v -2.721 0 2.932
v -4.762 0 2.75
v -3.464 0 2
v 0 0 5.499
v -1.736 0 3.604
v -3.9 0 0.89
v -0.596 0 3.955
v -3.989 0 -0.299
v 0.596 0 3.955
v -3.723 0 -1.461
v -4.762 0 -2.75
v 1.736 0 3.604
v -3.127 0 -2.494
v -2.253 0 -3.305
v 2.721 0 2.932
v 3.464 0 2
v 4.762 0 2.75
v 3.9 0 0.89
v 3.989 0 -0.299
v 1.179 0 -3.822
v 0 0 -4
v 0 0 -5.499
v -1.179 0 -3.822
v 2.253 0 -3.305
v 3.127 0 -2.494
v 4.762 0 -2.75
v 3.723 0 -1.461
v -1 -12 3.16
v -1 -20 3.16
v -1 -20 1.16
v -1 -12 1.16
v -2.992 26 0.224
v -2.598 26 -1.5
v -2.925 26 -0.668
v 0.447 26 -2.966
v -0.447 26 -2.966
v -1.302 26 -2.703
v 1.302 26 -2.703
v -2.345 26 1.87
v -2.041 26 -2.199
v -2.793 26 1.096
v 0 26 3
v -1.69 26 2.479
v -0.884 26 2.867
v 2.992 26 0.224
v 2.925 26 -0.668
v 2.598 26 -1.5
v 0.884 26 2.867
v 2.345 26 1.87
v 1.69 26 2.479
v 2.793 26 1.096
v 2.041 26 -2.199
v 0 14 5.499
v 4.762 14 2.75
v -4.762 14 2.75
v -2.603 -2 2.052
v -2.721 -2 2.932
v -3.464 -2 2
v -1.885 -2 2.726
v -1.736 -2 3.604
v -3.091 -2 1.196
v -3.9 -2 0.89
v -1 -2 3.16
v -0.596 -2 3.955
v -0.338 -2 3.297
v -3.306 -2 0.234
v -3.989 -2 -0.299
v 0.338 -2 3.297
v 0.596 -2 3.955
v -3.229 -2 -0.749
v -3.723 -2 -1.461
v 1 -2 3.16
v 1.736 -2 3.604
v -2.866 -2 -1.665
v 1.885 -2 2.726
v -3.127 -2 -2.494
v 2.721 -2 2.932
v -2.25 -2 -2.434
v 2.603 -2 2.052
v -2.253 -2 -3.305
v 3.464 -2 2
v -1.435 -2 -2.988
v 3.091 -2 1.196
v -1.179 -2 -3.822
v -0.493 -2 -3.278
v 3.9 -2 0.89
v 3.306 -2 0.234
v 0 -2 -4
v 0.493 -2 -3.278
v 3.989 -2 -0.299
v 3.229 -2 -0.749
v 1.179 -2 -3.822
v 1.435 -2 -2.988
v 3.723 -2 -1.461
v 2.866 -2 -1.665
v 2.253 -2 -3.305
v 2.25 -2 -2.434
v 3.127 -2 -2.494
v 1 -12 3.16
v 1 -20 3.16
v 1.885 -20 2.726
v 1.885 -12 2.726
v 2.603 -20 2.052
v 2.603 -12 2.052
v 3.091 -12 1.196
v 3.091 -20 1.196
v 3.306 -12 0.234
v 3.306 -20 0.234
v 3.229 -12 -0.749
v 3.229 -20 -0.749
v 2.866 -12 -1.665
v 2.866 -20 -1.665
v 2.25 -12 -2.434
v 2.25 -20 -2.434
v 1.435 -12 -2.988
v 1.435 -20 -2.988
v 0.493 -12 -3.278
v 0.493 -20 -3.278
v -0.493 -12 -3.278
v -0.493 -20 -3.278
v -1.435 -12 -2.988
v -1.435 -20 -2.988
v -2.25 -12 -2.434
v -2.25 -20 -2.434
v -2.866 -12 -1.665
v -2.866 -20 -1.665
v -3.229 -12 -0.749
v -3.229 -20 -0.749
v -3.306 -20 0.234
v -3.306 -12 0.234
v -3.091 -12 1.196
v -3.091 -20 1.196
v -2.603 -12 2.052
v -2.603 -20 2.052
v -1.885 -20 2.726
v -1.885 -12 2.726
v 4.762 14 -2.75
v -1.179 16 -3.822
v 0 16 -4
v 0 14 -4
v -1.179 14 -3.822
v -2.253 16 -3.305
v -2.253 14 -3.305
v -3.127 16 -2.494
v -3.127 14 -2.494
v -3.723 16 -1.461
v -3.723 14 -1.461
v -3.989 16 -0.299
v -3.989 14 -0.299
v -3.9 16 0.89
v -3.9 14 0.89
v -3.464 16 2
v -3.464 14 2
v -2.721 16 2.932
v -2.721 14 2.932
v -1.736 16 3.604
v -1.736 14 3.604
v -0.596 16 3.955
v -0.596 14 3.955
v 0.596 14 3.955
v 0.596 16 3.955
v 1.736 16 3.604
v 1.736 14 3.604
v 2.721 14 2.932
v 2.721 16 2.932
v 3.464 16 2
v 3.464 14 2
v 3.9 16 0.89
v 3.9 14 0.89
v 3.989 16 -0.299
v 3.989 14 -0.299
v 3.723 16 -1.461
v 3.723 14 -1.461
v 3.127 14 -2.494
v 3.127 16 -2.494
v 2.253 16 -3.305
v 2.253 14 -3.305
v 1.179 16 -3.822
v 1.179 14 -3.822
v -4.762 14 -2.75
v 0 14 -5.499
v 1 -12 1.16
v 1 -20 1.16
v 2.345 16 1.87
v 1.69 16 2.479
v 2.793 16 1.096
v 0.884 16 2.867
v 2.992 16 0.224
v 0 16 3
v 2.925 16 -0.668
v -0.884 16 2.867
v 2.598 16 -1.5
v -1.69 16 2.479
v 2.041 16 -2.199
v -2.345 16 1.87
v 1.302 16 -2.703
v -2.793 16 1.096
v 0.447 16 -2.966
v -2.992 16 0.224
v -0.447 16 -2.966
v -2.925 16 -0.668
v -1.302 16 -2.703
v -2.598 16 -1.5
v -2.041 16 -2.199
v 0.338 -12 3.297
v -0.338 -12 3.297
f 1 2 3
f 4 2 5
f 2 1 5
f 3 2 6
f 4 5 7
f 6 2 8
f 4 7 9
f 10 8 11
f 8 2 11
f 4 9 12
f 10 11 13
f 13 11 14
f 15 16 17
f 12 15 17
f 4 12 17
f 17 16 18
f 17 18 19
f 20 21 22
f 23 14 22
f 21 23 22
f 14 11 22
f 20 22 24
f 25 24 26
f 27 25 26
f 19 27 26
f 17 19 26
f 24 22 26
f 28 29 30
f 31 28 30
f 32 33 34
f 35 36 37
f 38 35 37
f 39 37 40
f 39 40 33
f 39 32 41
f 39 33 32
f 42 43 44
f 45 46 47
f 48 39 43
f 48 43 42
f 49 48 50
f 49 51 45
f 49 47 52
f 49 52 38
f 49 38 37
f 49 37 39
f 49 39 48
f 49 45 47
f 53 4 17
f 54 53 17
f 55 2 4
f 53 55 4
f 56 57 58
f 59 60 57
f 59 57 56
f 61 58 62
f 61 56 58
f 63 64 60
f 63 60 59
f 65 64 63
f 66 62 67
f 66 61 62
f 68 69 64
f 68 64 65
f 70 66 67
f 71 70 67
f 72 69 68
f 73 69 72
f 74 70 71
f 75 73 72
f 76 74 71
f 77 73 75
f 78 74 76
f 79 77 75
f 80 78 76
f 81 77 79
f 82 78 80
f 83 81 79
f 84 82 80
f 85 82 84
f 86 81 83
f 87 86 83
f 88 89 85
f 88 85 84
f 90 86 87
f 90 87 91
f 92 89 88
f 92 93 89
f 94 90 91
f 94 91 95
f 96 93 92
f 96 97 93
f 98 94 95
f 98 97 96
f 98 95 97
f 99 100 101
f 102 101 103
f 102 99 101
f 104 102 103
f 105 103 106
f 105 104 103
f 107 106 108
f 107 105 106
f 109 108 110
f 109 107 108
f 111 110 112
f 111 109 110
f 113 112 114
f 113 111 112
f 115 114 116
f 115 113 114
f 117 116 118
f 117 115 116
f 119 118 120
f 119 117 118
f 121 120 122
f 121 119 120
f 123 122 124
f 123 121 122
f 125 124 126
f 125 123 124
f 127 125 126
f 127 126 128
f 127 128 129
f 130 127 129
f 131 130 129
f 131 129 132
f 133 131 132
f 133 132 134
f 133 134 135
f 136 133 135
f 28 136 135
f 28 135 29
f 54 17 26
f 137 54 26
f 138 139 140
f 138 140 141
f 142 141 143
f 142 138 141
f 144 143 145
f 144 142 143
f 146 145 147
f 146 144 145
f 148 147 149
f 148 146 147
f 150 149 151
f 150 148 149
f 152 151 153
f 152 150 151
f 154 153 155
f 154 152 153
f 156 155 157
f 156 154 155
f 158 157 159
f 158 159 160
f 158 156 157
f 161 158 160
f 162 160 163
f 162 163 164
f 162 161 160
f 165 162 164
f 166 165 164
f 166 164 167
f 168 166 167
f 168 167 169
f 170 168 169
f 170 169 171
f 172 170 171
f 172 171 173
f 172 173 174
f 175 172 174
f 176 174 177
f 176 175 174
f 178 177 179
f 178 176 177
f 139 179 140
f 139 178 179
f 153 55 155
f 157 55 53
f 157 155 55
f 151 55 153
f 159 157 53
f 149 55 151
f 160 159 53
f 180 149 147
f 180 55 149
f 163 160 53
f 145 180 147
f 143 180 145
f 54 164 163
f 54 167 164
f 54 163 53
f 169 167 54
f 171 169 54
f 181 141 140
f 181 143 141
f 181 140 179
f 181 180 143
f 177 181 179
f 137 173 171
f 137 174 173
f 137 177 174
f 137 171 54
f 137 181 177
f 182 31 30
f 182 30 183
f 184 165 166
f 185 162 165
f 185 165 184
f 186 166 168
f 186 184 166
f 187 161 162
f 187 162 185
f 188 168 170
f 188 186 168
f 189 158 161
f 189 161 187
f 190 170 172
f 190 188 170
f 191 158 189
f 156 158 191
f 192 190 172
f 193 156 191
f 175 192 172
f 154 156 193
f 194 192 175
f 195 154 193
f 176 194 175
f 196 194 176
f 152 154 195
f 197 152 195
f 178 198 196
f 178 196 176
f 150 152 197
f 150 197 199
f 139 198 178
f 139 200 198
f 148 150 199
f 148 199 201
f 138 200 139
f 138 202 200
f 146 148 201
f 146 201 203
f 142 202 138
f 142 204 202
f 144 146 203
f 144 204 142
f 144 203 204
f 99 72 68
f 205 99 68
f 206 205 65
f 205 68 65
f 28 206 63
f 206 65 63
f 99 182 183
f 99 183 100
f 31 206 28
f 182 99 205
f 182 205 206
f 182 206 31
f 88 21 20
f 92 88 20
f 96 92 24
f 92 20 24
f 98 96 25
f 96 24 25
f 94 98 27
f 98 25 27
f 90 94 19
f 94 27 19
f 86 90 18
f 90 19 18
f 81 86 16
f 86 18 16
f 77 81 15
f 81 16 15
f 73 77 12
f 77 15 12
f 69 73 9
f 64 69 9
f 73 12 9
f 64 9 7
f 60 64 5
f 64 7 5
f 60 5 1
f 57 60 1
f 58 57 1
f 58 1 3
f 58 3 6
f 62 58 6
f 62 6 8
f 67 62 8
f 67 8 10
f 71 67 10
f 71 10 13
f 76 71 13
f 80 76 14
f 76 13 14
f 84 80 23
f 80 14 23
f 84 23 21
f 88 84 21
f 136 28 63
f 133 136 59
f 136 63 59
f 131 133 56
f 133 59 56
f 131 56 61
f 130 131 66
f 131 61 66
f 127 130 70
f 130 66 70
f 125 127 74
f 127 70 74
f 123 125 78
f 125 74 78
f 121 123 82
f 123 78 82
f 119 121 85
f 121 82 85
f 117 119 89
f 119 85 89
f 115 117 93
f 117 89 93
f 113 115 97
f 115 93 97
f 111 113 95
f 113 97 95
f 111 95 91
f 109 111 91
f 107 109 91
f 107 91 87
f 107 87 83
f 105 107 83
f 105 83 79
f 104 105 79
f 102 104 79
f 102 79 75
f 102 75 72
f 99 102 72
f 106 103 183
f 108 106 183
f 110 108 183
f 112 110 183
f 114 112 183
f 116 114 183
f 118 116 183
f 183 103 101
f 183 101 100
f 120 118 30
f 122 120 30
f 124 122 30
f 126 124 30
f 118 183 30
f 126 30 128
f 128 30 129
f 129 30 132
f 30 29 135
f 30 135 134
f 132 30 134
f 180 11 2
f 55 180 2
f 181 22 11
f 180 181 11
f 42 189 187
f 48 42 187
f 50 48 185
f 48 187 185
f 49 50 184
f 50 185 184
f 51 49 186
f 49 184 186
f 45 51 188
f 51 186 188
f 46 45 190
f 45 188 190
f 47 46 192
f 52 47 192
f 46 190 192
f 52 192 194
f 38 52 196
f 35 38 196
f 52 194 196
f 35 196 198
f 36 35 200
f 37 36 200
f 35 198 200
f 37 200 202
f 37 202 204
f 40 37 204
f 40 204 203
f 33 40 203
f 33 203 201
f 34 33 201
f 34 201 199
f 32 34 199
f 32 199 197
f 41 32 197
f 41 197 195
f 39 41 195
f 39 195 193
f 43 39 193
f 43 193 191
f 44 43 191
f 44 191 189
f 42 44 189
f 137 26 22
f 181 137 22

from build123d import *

# Parameters (mm, degrees)
BOSS_EXTRUDE1_DEPTH = 14
SKETCH4_R           = 4
BOSS_EXTRUDE2_DEPTH = 2
SKETCH4_7_R         = 3.314528
BOSS_EXTRUDE3_DEPTH = 12
BOSS_EXTRUDE5_START = 2
SKETCH5_R           = 4
SKETCH5_R_2         = 3
BOSS_EXTRUDE5_DEPTH = 2
SKETCH5_4_R         = 3
BOSS_EXTRUDE6_DEPTH = 12
BOSS_EXTRUDE7_DEPTH = 20


with BuildPart() as part:
    # Sketch1 → Boss-Extrude1 (new body)
    with BuildSketch(Plane(origin=(0, 0, 0), x_dir=(1, 0, 0), z_dir=(0, 1, 0))):
        Polygon((4.7625, -2.749631), (4.7625, 2.749631), (0, 5.499261), (-4.7625, 2.749631), (-4.7625, -2.749631), (0, -5.499261), align=None)
    extrude(amount=BOSS_EXTRUDE1_DEPTH)

    # Sketch4 → Boss-Extrude2 (add)
    with BuildSketch(Plane.XZ):
        with Locations(Location((0, 0, 0), (0, 0, 270))):
            Circle(SKETCH4_R)
    extrude(amount=BOSS_EXTRUDE2_DEPTH)

    # Sketch4<7> → Boss-Extrude3 (add)
    with BuildSketch(Plane.XZ):
        with Locations(Location((0, 0, 0), (0, 0, 270))):
            Circle(SKETCH4_7_R)
        with BuildLine():
            Line((-1, 3.160079), (-1, 1.160079))
            Line((-1, 1.160079), (1, 1.160079))
            Line((1, 1.160079), (1, 3.160079))
            ThreePointArc((1, 3.160079), (0, -3.314528), (-1, 3.160079))
        make_face()
    extrude(amount=BOSS_EXTRUDE3_DEPTH)

    # Sketch5 → Boss-Extrude5 (add)
    # profile 1 of 2: a face of its own
    with BuildSketch(Plane(origin=(0, 14, 0), x_dir=(1, 0, 0), z_dir=(0, 1, 0)).offset(BOSS_EXTRUDE5_START)):
        with Locations(Location((0, 0, 0), (0, 0, 90))):
            Circle(SKETCH5_R)
        Circle(SKETCH5_R_2, mode=Mode.SUBTRACT)
    # profile 2 of 2: a face of its own
    with BuildSketch(Plane(origin=(0, 14, 0), x_dir=(1, 0, 0), z_dir=(0, 1, 0)).offset(BOSS_EXTRUDE5_START)):
        Circle(SKETCH5_R_2)
    extrude(amount=-BOSS_EXTRUDE5_DEPTH)

    # Sketch5<4> → Boss-Extrude6 (add)
    with BuildSketch(Plane(origin=(0, 14, 0), x_dir=(1, 0, 0), z_dir=(0, 1, 0))):
        with Locations(Location((0, 0, 0), (0, 0, 270))):
            Circle(SKETCH5_4_R)
    extrude(amount=BOSS_EXTRUDE6_DEPTH)

    # Sketch4<13> → Boss-Extrude7 (add)
    with BuildSketch(Plane.XZ):
        with BuildLine():
            Line((-1, 3.160079), (-1, 1.160079))
            Line((-1, 1.160079), (1, 1.160079))
            Line((1, 1.160079), (1, 3.160079))
            ThreePointArc((1, 3.160079), (0, -3.314528), (-1, 3.160079))
        make_face()
    extrude(amount=BOSS_EXTRUDE7_DEPTH)


solid = part.part
